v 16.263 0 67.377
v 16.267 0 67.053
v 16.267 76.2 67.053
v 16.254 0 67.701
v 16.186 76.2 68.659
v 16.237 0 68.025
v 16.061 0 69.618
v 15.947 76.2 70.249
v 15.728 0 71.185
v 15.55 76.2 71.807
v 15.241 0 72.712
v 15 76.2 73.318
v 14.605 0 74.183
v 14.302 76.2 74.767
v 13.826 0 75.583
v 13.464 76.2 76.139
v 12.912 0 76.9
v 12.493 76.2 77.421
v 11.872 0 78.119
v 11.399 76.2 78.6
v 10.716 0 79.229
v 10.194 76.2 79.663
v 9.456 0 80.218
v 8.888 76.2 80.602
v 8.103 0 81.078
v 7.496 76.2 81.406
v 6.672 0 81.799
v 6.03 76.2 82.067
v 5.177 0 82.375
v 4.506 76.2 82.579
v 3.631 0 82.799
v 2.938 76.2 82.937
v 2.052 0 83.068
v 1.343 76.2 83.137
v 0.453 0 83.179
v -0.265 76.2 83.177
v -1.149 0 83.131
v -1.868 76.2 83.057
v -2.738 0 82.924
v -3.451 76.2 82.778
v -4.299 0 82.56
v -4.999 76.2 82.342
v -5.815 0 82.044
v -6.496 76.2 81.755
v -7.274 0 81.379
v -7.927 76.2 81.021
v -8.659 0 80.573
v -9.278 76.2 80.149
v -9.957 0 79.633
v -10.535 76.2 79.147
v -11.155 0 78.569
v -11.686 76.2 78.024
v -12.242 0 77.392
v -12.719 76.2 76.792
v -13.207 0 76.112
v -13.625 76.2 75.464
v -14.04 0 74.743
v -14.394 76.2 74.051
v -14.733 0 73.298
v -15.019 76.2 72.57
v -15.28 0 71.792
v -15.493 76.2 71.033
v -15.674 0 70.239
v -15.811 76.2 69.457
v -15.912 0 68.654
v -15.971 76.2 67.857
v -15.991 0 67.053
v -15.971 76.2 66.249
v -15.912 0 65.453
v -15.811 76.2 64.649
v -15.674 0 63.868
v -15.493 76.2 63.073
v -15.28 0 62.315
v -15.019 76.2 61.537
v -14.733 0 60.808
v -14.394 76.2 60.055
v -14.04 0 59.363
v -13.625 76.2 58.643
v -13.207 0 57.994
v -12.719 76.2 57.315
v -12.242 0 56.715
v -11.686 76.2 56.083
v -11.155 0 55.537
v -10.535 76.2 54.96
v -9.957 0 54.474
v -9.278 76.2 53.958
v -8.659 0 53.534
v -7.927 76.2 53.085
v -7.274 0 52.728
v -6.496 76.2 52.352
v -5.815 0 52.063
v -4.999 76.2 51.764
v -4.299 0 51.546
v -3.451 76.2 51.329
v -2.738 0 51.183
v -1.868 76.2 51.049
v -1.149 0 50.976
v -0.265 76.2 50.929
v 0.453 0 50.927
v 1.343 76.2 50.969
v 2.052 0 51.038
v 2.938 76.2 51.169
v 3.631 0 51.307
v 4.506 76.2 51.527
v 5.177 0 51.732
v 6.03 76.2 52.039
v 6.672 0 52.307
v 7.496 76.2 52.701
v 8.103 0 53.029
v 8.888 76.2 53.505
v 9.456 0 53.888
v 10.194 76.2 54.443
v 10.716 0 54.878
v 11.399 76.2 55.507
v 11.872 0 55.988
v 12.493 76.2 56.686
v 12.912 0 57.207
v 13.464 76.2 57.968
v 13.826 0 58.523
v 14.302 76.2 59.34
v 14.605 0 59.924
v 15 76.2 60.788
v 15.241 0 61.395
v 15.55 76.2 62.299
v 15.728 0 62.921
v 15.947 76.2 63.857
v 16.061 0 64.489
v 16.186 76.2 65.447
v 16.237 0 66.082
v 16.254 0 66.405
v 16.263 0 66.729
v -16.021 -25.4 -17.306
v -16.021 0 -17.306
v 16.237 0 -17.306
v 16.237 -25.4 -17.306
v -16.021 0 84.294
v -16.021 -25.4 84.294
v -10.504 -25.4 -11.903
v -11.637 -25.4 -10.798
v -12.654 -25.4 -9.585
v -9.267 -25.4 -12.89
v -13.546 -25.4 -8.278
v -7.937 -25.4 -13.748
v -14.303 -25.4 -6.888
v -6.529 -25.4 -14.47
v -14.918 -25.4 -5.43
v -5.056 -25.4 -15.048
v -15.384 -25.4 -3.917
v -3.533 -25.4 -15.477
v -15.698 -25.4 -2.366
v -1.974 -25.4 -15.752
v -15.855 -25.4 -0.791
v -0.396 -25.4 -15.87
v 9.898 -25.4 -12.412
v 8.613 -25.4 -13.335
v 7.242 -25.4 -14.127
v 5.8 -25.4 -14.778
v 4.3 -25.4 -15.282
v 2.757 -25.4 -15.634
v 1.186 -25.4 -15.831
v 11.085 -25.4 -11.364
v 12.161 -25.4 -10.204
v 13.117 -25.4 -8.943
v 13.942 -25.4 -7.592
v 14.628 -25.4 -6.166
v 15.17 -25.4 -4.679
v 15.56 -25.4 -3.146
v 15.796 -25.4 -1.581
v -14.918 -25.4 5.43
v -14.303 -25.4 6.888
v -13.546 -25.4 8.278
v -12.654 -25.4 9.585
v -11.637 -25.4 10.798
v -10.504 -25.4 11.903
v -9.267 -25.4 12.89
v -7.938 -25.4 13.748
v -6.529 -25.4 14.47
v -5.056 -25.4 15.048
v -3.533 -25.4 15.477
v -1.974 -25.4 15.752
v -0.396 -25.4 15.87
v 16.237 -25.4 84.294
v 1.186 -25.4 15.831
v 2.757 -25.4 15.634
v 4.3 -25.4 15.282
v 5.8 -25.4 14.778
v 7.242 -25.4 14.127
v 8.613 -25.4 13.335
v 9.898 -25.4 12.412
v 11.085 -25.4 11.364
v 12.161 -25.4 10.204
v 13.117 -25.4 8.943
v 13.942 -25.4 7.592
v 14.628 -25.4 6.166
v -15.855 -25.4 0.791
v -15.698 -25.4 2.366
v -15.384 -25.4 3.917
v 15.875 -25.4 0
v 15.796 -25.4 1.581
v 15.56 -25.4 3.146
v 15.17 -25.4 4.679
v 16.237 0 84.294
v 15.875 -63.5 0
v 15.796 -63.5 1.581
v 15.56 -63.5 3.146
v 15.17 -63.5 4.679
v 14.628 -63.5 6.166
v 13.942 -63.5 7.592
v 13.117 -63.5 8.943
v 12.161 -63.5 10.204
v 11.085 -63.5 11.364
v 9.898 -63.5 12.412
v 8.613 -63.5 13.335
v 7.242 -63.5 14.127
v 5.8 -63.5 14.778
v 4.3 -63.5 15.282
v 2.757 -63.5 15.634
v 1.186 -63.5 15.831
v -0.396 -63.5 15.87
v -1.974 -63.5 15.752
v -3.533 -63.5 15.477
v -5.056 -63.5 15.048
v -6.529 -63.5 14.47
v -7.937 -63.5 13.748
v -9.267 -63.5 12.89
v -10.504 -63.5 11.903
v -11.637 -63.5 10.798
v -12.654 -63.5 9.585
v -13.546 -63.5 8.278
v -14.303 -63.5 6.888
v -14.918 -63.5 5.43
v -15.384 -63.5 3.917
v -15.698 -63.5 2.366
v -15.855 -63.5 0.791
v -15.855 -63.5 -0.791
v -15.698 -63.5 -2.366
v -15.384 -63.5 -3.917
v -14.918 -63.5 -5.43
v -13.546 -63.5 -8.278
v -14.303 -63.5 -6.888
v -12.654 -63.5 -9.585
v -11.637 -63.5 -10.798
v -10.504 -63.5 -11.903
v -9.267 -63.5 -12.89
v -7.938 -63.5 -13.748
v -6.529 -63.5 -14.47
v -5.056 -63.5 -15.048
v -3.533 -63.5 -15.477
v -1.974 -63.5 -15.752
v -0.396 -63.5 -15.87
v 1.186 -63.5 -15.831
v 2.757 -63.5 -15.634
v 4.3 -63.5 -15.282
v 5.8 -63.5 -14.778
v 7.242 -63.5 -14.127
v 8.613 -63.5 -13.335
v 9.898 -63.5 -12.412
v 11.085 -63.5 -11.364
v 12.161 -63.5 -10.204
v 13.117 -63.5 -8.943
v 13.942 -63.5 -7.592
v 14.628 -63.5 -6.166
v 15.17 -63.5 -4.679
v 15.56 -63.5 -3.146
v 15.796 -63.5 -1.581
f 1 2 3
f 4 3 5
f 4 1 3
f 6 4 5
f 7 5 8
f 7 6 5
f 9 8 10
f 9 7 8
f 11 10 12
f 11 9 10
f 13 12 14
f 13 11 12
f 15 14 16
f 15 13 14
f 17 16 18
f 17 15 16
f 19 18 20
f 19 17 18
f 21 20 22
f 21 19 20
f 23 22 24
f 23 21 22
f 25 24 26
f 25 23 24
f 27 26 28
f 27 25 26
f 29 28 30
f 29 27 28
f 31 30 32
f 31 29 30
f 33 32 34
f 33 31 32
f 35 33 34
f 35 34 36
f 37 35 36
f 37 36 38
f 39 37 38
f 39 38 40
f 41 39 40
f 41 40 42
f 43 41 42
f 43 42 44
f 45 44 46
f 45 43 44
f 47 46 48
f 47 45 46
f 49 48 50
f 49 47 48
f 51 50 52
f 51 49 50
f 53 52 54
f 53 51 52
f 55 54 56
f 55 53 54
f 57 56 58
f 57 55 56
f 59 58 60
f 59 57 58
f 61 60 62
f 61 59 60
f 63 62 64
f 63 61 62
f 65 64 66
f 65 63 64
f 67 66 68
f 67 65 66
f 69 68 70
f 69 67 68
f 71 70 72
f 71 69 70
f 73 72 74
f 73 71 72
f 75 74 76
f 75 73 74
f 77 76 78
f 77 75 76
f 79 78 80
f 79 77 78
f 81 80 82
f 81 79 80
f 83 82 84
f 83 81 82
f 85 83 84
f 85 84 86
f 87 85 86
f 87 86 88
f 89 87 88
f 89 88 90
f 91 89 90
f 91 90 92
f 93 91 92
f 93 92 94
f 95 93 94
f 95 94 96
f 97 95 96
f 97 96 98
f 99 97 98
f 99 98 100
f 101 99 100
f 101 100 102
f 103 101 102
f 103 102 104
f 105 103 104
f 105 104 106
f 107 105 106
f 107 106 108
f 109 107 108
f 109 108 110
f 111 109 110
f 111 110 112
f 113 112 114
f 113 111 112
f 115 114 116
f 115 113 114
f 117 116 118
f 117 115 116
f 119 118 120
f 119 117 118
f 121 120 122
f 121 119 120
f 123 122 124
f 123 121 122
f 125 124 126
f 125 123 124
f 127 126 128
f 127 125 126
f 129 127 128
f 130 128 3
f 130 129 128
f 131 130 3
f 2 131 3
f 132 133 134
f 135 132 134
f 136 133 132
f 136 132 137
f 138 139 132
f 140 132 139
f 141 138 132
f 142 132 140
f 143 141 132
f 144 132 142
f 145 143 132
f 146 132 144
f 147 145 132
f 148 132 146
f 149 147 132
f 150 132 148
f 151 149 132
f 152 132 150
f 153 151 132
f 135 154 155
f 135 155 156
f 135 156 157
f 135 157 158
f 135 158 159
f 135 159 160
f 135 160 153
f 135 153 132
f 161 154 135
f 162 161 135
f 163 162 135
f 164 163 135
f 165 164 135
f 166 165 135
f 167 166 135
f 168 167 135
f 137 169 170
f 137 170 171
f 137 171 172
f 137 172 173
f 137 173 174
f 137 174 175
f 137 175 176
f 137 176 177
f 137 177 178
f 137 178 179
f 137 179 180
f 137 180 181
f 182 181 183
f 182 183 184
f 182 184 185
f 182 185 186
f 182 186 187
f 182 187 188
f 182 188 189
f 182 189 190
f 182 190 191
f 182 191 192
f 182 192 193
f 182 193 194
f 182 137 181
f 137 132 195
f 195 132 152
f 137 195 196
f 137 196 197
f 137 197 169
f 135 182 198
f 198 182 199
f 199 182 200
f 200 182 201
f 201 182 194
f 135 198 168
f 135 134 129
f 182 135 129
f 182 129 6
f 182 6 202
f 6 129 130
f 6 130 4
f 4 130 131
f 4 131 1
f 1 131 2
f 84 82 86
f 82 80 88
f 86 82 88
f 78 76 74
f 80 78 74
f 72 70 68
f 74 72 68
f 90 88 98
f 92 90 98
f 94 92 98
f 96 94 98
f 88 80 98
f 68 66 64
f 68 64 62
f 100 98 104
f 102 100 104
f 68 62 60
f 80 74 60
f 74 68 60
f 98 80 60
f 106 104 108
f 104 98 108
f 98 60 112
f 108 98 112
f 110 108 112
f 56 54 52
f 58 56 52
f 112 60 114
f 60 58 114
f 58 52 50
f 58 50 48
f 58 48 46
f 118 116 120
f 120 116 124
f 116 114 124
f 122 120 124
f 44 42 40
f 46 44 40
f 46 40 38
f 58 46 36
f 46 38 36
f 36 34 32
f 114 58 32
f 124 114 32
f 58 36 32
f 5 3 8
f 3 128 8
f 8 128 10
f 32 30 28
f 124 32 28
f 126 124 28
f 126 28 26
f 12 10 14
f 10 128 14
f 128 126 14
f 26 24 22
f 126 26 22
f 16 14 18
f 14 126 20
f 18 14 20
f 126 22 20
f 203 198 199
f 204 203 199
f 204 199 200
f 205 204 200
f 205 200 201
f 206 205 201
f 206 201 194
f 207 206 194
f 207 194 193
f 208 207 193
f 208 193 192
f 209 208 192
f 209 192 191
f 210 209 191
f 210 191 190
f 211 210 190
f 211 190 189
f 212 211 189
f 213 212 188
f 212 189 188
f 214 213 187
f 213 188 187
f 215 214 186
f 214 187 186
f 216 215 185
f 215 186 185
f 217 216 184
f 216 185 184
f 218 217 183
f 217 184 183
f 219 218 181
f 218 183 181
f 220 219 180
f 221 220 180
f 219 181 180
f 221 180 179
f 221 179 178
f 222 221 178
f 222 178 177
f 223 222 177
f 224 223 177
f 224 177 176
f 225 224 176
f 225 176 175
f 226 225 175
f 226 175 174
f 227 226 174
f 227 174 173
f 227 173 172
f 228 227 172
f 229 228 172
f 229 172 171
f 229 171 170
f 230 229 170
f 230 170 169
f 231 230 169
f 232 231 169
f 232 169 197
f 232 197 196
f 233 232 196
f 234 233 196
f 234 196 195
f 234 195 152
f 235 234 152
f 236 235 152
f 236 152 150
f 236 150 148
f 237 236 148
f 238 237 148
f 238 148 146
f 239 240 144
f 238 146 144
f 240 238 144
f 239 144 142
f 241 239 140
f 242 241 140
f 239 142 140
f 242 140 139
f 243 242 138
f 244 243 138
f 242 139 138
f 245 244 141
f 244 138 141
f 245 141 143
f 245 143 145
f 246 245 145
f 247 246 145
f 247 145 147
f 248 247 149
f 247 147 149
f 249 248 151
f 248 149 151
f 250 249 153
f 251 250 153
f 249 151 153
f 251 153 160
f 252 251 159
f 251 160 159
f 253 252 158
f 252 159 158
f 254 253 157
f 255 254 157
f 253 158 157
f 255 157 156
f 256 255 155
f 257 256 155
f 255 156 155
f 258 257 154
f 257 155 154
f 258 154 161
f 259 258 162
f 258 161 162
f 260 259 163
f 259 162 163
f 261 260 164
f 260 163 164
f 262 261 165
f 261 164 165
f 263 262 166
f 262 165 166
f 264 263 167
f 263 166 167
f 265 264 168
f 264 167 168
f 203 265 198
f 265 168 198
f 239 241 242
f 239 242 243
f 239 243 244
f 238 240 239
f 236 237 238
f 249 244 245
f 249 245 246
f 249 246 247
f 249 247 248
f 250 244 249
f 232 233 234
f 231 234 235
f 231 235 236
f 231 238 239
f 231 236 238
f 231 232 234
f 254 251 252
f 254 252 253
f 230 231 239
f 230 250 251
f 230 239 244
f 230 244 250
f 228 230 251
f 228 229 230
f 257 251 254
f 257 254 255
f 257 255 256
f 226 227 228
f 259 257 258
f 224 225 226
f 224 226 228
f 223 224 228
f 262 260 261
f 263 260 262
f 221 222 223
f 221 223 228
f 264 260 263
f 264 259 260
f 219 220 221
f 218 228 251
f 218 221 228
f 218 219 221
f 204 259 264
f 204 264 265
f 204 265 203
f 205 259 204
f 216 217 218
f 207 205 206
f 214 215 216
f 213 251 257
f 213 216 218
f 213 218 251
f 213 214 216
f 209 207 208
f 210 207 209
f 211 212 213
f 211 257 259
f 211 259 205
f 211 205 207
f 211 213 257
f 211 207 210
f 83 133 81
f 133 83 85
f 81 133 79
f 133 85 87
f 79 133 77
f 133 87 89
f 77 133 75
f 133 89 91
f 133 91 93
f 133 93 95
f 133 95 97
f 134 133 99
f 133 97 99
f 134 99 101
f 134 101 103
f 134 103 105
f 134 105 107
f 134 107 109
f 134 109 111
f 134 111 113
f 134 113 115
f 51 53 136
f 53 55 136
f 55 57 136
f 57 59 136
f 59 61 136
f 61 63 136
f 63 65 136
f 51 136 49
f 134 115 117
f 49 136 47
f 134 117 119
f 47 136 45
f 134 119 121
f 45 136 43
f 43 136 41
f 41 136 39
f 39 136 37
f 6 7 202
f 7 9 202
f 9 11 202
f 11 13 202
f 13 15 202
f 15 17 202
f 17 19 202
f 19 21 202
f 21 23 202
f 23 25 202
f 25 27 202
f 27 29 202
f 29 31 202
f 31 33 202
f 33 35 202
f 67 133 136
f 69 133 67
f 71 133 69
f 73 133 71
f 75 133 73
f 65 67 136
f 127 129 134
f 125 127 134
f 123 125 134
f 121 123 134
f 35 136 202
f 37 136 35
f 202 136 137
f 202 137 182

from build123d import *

# Parameters (mm, degrees)
F0_R     = 15.875
F1_DEPTH = 63.5
F2_W     = 32.258
F2_H     = 101.6
F3_DEPTH = 25.4
F4_R     = 16.129
F5_DEPTH = 76.2


with BuildPart() as f1:
    # F0 (on Front) → F1 (new body)
    with BuildSketch(Plane.XZ):
        Circle(F0_R)
    extrude(amount=F1_DEPTH)

    # F2 (on Front) → F3 (join)
    with BuildSketch(Plane.XZ):
        with Locations((0.108262, 33.494265)):
            Rectangle(F2_W, F2_H)
    extrude(amount=F3_DEPTH)

    # F4 (on Front) → F5 (join)
    with BuildSketch(Plane.XZ):
        with Locations((0.137554, 67.053316)):
            Circle(F4_R)
    extrude(amount=-F5_DEPTH)


solid = f1.part
